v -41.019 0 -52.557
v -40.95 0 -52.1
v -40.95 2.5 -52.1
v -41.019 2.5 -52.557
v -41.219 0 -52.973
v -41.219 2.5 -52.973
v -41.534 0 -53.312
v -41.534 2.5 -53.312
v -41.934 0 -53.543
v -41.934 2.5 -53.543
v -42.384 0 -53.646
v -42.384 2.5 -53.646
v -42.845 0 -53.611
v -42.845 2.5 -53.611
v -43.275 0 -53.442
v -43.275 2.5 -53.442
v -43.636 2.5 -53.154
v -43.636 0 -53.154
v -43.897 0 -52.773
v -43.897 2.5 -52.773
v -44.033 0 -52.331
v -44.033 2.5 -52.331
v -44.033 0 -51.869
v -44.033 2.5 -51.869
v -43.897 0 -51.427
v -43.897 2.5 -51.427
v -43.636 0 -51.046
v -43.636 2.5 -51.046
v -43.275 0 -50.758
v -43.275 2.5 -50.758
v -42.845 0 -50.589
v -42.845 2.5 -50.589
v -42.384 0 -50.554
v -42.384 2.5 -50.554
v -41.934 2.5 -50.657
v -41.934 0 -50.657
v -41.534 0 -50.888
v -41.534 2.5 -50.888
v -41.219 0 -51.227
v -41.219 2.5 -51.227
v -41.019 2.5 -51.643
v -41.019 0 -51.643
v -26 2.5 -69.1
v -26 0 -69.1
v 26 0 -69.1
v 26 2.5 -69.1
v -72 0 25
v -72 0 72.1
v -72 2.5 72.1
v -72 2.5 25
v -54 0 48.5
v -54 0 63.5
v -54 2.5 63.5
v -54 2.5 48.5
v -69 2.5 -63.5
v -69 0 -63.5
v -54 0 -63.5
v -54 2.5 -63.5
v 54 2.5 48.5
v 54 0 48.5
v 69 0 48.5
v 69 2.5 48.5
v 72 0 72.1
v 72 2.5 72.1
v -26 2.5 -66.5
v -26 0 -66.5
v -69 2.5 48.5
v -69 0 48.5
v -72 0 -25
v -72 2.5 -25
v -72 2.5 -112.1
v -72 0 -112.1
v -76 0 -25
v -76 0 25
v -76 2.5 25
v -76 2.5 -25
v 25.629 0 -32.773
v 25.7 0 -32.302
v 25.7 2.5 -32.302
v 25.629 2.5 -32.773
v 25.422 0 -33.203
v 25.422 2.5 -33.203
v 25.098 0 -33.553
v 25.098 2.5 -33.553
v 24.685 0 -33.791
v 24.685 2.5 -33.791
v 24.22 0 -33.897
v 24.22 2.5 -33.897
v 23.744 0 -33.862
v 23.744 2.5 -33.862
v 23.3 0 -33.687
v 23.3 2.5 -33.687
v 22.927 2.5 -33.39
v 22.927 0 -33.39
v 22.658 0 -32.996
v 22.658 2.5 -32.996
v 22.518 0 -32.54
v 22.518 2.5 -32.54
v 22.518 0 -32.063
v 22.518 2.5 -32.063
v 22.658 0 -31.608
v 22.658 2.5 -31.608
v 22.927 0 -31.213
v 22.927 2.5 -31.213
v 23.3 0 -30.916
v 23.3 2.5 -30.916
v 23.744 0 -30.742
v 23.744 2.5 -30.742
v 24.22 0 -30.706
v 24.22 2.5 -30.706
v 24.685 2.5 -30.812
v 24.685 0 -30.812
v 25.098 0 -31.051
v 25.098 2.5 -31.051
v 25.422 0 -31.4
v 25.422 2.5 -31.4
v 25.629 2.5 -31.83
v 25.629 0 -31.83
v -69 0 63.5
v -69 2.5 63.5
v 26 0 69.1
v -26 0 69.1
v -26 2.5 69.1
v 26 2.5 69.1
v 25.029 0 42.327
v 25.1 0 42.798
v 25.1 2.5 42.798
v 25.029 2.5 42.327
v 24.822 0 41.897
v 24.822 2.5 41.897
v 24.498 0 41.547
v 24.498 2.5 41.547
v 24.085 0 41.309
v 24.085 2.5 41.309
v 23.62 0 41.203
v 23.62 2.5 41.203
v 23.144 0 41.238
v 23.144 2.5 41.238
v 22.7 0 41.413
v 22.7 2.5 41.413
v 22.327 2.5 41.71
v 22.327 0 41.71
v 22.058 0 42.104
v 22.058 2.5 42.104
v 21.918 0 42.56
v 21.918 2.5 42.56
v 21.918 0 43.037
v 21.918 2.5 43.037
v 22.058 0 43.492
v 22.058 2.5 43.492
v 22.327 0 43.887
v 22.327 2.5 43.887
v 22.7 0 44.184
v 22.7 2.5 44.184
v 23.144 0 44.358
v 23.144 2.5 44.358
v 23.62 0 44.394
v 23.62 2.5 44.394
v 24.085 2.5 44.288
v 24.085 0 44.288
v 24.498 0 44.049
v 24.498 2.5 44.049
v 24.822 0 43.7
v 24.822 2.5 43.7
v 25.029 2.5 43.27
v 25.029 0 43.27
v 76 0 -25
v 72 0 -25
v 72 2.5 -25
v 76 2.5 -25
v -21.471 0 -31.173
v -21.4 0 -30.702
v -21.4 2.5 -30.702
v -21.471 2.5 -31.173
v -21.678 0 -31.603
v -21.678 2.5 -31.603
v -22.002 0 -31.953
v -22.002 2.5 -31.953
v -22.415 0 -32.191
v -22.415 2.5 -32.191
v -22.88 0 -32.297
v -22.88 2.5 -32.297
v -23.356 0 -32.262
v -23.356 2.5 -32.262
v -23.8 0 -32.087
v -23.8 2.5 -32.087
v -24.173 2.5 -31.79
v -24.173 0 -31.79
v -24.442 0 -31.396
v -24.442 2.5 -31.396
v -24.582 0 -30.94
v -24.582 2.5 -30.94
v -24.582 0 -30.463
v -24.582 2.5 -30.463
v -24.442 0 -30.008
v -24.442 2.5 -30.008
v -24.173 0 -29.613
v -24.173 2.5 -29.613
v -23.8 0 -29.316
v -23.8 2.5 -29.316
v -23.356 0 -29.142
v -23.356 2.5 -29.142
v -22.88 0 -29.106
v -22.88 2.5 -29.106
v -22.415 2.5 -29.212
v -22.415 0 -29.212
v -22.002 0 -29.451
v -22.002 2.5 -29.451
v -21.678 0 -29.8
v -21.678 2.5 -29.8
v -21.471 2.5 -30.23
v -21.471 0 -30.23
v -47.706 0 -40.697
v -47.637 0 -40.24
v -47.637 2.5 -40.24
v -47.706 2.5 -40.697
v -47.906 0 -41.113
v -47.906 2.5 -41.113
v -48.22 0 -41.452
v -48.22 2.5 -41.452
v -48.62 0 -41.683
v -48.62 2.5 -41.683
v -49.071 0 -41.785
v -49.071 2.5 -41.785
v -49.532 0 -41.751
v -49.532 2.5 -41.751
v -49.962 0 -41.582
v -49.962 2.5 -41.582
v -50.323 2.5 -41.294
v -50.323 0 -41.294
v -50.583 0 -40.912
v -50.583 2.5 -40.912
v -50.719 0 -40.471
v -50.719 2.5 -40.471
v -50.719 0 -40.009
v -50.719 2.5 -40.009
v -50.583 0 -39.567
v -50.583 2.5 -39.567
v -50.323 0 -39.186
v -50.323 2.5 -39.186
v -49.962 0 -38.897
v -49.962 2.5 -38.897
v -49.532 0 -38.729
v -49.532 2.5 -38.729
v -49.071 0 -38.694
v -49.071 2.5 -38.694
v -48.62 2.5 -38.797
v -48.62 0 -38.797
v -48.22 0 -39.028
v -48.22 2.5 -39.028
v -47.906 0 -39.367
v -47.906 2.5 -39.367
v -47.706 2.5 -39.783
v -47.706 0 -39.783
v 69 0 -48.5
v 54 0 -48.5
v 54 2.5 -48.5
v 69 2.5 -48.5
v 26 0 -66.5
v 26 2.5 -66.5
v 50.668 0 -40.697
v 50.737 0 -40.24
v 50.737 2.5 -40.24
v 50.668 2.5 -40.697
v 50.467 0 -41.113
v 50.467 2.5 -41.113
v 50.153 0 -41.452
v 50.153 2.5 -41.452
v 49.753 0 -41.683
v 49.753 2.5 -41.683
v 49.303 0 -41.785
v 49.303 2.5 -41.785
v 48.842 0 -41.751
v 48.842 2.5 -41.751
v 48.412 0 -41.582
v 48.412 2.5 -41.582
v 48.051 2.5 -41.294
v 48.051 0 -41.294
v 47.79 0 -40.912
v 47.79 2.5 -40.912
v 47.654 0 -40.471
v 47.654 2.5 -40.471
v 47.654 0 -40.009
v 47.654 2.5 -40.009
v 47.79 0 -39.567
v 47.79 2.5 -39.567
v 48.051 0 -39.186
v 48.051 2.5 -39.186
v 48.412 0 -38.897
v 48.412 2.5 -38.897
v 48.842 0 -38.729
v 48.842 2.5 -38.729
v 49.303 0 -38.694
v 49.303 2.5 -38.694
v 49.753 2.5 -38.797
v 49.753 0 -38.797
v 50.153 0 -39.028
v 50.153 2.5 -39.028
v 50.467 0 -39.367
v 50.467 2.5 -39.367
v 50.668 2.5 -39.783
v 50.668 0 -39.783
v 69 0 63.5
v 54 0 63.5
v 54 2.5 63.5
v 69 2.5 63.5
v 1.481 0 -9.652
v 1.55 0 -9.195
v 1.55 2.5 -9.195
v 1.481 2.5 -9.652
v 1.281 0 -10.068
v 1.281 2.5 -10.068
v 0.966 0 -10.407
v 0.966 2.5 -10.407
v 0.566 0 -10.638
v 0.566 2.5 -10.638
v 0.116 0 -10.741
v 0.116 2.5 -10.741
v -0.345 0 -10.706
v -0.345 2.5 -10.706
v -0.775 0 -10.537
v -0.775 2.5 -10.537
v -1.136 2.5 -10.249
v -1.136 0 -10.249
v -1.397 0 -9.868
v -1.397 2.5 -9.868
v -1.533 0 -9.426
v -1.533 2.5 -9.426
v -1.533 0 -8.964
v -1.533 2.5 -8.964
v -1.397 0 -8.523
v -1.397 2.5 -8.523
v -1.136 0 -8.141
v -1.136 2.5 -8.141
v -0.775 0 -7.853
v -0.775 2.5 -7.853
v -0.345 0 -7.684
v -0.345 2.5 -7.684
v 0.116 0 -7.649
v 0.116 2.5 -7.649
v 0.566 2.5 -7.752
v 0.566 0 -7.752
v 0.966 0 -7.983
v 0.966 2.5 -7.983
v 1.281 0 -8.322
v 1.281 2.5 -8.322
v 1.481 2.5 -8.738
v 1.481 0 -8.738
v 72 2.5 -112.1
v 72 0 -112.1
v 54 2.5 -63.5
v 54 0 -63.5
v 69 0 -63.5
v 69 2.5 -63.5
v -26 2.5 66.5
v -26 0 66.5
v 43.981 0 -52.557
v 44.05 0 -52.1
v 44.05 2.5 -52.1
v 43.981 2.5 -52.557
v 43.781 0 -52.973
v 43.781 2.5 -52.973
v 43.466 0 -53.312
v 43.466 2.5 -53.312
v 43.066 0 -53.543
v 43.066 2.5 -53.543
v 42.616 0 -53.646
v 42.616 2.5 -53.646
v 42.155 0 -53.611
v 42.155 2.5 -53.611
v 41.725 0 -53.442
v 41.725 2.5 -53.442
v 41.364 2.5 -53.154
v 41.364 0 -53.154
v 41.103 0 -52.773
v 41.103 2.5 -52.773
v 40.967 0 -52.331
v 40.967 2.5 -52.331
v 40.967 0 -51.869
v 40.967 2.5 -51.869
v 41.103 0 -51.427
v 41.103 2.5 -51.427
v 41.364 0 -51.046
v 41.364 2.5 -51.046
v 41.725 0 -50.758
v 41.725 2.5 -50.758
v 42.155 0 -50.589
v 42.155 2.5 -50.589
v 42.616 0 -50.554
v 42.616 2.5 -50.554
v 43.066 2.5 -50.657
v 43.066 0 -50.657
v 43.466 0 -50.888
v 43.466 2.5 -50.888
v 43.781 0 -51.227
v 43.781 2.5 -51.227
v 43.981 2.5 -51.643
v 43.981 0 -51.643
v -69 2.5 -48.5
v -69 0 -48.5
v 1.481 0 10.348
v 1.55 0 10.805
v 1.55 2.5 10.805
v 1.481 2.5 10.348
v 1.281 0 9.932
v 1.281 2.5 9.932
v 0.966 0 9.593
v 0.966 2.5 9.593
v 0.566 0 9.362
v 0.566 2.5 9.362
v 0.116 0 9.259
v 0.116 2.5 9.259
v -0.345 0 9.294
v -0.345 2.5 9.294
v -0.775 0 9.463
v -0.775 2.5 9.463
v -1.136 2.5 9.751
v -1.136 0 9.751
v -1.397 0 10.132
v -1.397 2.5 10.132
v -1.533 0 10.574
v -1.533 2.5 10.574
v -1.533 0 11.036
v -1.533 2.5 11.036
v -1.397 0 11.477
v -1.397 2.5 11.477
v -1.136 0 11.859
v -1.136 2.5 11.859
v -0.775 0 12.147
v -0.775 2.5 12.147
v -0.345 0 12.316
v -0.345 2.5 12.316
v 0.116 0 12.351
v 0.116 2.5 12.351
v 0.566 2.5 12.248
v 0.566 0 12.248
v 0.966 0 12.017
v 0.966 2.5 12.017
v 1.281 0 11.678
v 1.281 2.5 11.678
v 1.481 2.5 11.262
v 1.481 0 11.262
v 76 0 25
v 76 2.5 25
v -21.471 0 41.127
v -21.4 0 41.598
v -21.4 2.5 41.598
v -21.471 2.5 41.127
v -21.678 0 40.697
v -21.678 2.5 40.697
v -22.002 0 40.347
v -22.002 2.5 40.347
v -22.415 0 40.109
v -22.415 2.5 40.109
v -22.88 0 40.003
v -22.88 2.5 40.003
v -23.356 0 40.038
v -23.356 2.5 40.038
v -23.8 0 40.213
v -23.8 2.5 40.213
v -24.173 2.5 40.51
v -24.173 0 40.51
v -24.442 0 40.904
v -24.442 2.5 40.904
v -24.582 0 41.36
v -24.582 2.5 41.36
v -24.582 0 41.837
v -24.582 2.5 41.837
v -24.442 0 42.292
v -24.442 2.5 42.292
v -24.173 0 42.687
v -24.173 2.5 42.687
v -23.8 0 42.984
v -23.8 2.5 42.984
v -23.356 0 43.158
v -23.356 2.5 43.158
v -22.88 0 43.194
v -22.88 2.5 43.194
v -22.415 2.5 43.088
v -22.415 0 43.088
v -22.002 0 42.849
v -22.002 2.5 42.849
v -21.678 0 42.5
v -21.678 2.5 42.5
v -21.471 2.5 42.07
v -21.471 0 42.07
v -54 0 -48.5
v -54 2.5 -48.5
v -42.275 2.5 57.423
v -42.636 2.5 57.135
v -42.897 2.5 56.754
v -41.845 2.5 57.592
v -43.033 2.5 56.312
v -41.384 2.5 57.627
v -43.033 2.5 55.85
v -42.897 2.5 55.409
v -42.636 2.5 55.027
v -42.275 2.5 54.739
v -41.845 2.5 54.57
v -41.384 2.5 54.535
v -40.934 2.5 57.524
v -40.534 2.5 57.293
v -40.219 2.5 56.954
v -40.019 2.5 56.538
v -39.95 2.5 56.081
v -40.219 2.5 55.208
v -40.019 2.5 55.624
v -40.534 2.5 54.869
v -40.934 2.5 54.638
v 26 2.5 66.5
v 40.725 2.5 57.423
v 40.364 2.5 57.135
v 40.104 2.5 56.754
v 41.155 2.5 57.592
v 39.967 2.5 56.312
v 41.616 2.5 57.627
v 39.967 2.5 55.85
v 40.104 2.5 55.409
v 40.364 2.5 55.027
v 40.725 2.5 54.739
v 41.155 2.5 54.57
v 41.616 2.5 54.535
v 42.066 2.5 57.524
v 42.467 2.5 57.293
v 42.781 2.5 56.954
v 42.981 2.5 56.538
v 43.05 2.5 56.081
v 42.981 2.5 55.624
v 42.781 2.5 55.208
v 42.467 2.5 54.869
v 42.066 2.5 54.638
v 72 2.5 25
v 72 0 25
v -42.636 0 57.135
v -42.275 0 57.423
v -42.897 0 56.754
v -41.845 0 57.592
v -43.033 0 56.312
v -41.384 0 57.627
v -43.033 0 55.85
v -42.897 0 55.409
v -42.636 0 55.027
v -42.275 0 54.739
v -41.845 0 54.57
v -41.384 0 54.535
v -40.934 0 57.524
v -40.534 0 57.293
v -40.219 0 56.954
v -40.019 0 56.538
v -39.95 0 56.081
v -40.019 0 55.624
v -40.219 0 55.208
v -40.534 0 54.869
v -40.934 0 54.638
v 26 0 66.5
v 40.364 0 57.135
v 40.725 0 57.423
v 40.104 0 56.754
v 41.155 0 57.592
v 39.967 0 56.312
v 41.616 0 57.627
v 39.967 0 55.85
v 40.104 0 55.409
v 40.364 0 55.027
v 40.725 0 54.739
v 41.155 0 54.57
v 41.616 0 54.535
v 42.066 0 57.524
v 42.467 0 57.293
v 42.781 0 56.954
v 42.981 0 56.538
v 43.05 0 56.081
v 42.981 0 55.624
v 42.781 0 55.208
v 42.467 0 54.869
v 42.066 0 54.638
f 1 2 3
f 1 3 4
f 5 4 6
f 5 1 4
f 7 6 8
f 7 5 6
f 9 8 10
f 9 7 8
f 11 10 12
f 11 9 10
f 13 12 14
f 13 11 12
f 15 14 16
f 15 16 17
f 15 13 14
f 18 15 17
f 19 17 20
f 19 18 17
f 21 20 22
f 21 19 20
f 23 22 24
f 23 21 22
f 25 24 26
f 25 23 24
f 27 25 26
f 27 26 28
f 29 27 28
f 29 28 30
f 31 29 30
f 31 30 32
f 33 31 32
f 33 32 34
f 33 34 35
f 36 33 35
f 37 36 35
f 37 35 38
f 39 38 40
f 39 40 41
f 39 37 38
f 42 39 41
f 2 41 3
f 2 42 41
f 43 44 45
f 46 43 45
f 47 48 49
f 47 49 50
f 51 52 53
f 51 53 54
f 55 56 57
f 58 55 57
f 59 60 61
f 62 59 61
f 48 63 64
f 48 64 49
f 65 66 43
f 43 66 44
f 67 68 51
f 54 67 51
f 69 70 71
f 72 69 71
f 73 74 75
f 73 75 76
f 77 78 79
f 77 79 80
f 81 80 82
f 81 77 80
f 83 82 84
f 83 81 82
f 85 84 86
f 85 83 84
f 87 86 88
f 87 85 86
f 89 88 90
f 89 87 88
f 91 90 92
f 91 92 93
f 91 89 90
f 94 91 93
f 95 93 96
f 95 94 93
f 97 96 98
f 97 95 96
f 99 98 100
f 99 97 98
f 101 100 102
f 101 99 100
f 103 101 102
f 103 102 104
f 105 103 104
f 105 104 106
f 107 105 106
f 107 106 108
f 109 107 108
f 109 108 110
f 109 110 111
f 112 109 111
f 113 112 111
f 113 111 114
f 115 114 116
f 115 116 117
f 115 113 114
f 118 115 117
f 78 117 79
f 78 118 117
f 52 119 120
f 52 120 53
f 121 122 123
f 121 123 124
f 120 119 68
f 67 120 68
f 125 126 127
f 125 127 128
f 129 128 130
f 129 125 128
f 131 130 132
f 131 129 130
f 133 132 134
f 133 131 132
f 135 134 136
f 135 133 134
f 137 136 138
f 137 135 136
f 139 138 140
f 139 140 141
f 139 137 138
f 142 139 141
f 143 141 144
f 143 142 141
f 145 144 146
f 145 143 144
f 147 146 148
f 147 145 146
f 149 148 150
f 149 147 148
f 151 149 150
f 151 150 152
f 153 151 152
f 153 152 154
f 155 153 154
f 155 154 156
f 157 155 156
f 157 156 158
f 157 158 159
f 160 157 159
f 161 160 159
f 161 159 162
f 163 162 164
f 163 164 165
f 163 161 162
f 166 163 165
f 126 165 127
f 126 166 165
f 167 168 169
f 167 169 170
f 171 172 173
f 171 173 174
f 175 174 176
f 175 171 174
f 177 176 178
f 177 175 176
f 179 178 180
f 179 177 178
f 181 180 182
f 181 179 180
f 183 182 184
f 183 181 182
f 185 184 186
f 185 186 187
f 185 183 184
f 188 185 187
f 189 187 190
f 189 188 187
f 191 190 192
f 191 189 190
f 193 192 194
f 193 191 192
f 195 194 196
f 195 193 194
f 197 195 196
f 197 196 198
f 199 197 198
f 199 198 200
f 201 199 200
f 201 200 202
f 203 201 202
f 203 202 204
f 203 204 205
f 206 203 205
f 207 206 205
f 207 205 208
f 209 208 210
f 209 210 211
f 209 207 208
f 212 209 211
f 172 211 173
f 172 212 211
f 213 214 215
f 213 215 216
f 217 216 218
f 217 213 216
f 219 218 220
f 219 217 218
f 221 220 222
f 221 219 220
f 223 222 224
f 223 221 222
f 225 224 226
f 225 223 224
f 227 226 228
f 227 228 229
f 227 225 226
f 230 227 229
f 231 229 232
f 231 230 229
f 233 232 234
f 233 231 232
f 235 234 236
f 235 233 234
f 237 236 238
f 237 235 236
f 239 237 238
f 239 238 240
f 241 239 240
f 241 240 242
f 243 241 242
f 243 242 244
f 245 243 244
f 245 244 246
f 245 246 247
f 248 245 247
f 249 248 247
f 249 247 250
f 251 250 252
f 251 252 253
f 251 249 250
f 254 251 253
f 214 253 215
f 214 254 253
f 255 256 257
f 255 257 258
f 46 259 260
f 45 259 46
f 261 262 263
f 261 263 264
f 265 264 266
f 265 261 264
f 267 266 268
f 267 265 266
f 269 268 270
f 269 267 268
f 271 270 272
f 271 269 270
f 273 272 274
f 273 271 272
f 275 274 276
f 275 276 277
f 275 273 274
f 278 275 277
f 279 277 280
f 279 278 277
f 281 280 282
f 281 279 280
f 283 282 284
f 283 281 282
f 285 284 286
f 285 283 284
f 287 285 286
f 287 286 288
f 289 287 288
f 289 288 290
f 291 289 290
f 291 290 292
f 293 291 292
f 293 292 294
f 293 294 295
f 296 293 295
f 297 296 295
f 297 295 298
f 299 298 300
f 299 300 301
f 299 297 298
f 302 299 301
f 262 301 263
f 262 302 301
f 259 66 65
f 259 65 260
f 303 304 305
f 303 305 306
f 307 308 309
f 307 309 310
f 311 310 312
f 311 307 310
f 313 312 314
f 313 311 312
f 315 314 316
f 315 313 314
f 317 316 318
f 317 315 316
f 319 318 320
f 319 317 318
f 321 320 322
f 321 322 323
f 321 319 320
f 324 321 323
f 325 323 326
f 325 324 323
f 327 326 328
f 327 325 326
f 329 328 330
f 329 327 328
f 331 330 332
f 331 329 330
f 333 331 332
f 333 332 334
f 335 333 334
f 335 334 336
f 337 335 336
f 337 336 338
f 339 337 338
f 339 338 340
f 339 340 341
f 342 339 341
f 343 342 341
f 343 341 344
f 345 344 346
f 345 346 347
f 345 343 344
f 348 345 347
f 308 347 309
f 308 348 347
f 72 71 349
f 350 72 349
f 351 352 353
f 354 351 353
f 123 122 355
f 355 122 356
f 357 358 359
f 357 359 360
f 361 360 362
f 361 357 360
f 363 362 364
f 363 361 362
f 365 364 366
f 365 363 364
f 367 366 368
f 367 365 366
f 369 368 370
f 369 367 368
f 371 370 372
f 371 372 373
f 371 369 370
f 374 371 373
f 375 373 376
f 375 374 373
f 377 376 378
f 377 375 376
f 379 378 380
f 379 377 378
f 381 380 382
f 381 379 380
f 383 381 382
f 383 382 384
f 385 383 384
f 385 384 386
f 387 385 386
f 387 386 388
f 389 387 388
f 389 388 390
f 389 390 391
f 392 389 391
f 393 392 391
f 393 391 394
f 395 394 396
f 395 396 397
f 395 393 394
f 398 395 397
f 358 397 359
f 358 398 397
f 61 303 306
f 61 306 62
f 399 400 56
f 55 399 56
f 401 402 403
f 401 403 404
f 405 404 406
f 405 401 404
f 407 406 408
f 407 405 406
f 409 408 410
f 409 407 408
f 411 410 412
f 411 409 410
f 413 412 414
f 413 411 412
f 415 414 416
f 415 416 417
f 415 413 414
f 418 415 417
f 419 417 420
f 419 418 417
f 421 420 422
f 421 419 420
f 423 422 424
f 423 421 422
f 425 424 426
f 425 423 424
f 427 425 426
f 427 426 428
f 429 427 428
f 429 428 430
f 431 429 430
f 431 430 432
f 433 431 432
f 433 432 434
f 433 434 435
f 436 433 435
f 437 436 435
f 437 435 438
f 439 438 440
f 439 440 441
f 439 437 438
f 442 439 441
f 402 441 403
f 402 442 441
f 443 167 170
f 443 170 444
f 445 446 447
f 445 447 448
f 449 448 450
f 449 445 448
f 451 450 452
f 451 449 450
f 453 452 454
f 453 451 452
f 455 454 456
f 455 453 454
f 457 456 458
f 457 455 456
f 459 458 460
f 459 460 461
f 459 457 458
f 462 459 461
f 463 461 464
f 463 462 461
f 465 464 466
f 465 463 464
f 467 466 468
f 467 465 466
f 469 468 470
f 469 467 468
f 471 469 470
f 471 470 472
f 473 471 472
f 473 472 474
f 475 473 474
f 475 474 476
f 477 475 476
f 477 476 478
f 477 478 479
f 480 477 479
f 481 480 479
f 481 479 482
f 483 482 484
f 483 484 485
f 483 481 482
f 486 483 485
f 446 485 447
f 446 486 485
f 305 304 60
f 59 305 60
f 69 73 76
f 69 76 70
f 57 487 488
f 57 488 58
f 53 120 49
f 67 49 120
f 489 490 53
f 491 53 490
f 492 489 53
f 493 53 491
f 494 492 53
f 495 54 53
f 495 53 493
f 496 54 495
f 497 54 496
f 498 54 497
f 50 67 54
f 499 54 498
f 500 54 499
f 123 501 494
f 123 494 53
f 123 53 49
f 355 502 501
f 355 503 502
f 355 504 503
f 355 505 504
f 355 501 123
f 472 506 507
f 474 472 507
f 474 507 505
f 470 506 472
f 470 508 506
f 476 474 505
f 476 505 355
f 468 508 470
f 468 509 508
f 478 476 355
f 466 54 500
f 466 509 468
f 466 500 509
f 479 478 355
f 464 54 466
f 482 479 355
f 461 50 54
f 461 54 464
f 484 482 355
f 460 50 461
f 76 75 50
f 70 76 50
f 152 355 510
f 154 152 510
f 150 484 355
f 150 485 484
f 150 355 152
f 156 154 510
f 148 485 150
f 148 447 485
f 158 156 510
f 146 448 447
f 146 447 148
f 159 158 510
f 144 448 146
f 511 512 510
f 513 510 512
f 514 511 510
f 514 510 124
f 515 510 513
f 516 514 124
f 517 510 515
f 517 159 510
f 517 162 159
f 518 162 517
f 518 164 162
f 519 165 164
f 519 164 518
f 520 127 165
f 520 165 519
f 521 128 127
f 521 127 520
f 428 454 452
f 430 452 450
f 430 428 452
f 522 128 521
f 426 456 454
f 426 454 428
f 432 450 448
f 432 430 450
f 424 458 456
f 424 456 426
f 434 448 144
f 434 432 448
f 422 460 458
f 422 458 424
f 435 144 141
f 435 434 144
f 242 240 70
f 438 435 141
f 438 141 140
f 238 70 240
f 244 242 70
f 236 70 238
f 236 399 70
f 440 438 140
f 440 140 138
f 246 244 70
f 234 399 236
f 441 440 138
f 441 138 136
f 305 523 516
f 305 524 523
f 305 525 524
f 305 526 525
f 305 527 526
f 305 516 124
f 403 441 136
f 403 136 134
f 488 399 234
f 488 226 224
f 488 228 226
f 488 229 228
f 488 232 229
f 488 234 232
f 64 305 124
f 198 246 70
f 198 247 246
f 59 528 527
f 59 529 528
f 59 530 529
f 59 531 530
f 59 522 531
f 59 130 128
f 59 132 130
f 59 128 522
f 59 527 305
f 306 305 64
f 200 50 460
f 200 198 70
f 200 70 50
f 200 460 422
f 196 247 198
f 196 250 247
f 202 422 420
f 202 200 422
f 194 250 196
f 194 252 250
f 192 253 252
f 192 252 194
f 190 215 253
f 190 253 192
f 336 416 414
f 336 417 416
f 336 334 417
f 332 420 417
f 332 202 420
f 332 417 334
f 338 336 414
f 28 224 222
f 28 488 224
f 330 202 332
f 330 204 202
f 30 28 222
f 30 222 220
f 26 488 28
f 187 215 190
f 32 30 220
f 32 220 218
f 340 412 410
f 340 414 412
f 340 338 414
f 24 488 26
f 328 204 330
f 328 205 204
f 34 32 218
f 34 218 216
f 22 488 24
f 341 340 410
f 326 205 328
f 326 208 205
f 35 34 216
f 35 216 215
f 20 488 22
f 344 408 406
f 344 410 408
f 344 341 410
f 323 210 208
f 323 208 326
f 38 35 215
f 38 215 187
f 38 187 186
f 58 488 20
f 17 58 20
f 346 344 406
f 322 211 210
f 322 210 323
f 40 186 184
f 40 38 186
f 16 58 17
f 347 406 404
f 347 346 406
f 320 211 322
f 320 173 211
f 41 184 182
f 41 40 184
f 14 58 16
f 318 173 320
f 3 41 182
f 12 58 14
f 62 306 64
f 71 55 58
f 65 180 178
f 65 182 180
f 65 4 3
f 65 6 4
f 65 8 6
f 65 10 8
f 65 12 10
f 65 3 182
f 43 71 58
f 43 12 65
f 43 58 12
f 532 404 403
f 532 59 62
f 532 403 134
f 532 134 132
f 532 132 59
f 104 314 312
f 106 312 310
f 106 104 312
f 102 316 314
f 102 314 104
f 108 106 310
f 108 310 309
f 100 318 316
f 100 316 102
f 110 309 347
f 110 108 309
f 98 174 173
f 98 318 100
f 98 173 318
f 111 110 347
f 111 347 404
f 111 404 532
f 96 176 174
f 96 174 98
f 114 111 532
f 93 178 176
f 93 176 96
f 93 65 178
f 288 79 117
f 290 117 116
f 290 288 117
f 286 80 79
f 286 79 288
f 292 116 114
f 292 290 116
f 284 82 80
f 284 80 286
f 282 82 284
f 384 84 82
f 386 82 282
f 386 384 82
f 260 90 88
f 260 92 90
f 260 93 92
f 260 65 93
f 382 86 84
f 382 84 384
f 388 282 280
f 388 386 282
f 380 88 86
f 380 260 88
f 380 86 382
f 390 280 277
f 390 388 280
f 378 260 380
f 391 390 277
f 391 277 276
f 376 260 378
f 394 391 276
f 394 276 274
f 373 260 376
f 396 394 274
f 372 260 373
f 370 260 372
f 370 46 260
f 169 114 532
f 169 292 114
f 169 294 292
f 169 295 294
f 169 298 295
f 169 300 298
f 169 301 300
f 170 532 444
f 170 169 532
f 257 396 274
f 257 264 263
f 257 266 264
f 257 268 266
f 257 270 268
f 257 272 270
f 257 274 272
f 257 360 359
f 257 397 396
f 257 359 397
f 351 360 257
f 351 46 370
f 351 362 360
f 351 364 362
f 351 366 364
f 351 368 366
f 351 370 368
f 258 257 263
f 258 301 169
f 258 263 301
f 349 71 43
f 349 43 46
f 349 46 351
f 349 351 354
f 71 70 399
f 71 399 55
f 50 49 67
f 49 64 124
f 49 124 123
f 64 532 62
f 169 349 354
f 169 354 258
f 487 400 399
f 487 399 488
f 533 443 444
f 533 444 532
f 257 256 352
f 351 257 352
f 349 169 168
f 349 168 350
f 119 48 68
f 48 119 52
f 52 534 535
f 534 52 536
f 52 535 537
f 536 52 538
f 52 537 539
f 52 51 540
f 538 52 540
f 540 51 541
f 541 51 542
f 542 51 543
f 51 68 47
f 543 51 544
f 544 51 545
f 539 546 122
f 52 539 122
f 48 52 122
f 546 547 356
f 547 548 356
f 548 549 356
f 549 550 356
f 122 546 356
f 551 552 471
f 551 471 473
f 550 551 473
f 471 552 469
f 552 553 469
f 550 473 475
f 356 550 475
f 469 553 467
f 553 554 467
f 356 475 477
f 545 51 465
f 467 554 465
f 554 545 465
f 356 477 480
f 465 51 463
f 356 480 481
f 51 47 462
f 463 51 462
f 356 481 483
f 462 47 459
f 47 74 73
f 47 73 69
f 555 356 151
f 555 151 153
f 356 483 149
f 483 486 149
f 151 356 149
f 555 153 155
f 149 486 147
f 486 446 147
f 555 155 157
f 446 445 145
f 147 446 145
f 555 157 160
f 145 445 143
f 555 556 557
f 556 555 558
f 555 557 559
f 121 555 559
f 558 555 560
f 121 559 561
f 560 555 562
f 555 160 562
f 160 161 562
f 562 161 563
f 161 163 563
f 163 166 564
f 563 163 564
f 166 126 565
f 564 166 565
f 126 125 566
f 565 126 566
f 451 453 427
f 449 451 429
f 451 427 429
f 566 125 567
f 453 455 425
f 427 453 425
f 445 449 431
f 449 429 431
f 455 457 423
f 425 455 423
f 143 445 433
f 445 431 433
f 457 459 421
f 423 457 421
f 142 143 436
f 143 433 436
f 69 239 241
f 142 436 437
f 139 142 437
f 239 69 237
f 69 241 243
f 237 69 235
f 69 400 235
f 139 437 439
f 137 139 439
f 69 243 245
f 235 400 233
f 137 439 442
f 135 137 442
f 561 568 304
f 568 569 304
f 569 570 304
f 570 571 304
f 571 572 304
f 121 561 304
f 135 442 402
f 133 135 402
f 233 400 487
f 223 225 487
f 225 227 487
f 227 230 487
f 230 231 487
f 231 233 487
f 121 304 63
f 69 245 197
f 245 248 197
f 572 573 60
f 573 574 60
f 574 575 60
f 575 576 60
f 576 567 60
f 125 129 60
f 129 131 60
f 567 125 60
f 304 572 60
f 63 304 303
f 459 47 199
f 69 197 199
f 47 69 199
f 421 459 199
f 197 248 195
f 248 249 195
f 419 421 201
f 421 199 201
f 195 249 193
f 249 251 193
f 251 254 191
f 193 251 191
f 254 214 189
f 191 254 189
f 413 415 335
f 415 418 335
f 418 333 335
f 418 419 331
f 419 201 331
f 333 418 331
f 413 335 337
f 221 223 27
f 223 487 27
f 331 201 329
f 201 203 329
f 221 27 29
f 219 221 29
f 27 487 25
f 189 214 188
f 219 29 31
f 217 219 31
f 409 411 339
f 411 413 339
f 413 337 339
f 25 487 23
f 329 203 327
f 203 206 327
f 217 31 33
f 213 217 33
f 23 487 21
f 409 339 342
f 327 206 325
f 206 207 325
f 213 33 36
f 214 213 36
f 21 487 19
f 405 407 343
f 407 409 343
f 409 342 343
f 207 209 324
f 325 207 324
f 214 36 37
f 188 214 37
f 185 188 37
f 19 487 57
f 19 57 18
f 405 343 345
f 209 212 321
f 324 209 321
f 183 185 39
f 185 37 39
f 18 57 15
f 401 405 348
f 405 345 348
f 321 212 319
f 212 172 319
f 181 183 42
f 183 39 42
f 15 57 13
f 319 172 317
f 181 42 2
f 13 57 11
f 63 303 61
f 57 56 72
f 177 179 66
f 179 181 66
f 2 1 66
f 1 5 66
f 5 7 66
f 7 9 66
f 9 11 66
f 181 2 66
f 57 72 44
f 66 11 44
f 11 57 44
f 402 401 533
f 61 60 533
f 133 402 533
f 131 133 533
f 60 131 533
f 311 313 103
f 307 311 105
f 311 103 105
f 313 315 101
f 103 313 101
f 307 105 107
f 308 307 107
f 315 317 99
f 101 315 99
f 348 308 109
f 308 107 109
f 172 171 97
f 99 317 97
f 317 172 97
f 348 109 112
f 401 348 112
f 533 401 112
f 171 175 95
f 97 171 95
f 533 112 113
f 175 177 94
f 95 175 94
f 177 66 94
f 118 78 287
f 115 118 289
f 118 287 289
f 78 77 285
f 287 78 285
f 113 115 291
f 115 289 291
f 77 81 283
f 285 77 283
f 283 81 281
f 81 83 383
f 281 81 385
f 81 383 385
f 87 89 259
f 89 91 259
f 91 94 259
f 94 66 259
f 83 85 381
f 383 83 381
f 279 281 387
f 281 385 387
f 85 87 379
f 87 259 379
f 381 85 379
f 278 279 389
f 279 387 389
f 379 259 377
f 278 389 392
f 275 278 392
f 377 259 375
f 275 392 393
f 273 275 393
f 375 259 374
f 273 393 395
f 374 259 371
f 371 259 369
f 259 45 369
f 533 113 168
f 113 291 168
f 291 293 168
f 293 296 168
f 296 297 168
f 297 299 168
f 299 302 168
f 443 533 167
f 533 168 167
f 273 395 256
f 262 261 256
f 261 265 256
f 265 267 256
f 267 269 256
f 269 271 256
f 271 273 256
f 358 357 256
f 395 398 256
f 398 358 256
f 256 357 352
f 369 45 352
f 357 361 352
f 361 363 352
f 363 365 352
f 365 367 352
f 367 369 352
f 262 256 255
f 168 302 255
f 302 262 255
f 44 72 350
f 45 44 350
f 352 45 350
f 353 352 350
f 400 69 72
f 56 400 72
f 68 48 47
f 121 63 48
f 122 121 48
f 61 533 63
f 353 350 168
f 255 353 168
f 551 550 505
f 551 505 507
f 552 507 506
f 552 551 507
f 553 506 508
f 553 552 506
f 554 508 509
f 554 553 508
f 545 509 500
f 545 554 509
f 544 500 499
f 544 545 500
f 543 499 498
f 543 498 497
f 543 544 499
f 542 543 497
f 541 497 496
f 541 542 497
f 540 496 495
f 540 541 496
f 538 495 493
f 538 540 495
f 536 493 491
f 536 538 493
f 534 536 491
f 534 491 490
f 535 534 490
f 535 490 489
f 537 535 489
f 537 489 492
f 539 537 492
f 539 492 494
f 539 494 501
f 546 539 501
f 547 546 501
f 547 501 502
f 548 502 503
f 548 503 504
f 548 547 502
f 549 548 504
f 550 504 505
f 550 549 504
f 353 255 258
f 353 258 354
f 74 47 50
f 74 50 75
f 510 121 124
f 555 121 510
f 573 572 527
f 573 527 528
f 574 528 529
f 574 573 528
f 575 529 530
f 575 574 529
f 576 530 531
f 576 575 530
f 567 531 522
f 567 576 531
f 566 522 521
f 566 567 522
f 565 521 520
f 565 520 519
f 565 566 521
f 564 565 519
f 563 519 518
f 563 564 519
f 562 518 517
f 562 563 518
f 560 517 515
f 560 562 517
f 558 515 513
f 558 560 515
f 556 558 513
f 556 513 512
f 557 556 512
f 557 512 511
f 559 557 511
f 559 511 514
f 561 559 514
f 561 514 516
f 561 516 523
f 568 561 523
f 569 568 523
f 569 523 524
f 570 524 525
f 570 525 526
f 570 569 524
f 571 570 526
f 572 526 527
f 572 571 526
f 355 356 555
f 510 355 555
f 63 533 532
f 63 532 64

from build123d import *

# Parameters (mm, degrees)
SKETCH1_R           = 1.55
SKETCH1_R_2         = 1.6
SKETCH1_W           = 15
SKETCH1_H           = 15
SKETCH1_W_2         = 52
SKETCH1_H_2         = 2.6
BOSS_EXTRUDE1_DEPTH = 2.5
SKETCH2_W           = 144
SKETCH2_H           = 40
BOSS_EXTRUDE2_DEPTH = 2.5


with BuildPart() as part:
    # Sketch1 → Boss-Extrude1 (new body)
    with BuildSketch(Plane(origin=(0, 0, 0), x_dir=(1, 0, 0), z_dir=(0, 1, 0))):
        Polygon((-72, -25), (-76, -25), (-76, 25), (-72, 25), (-72, 72.1), (72, 72.1), (72, 25), (76, 25), (76, -25), (72, -25), (72, -72.1), (-72, -72.1), align=None)
        with Locations((0, -10.804905882)):
            Circle(SKETCH1_R, mode=Mode.SUBTRACT)
        with Locations((0, 9.195094118)):
            Circle(SKETCH1_R, mode=Mode.SUBTRACT)
        with Locations((-49.186770493, 40.239784928)):
            Circle(SKETCH1_R, mode=Mode.SUBTRACT)
        with Locations((49.186770493, 40.239784928)):
            Circle(SKETCH1_R, mode=Mode.SUBTRACT)
        with Locations((-41.500164476, -56.081111214)):
            Circle(SKETCH1_R, mode=Mode.SUBTRACT)
        with Locations((41.500164476, -56.081111214)):
            Circle(SKETCH1_R, mode=Mode.SUBTRACT)
        with Locations((-23, 30.701748775)):
            Circle(SKETCH1_R_2, mode=Mode.SUBTRACT)
        with Locations((24.1, 32.301748775)):
            Circle(SKETCH1_R_2, mode=Mode.SUBTRACT)
        with Locations((23.5, -42.798251225)):
            Circle(SKETCH1_R_2, mode=Mode.SUBTRACT)
        with Locations((-23, -41.598251225)):
            Circle(SKETCH1_R_2, mode=Mode.SUBTRACT)
        with Locations((42.5, 52.1)):
            Circle(SKETCH1_R, mode=Mode.SUBTRACT)
        with Locations((-42.5, 52.1)):
            Circle(SKETCH1_R, mode=Mode.SUBTRACT)
        with Locations((61.5, 56)):
            Rectangle(SKETCH1_W, SKETCH1_H, mode=Mode.SUBTRACT)
        with Locations((-61.5, 56)):
            Rectangle(SKETCH1_W, SKETCH1_H, mode=Mode.SUBTRACT)
        with Locations((0, -67.8)):
            Rectangle(SKETCH1_W_2, SKETCH1_H_2, mode=Mode.SUBTRACT)
        with Locations((0, 67.8)):
            Rectangle(SKETCH1_W_2, SKETCH1_H_2, mode=Mode.SUBTRACT)
        with Locations((-61.5, -56)):
            Rectangle(SKETCH1_W, SKETCH1_H, mode=Mode.SUBTRACT)
        with Locations((61.5, -56)):
            Rectangle(SKETCH1_W, SKETCH1_H, mode=Mode.SUBTRACT)
    extrude(amount=BOSS_EXTRUDE1_DEPTH)

    # Sketch2 → Boss-Extrude2 (add)
    with BuildSketch(Plane(origin=(0, 2.5, 0), x_dir=(1, 0, 0), z_dir=(0, 1, 0))):
        with Locations((0, 92.1)):
            Rectangle(SKETCH2_W, SKETCH2_H)
    extrude(amount=-BOSS_EXTRUDE2_DEPTH)


solid = part.part
